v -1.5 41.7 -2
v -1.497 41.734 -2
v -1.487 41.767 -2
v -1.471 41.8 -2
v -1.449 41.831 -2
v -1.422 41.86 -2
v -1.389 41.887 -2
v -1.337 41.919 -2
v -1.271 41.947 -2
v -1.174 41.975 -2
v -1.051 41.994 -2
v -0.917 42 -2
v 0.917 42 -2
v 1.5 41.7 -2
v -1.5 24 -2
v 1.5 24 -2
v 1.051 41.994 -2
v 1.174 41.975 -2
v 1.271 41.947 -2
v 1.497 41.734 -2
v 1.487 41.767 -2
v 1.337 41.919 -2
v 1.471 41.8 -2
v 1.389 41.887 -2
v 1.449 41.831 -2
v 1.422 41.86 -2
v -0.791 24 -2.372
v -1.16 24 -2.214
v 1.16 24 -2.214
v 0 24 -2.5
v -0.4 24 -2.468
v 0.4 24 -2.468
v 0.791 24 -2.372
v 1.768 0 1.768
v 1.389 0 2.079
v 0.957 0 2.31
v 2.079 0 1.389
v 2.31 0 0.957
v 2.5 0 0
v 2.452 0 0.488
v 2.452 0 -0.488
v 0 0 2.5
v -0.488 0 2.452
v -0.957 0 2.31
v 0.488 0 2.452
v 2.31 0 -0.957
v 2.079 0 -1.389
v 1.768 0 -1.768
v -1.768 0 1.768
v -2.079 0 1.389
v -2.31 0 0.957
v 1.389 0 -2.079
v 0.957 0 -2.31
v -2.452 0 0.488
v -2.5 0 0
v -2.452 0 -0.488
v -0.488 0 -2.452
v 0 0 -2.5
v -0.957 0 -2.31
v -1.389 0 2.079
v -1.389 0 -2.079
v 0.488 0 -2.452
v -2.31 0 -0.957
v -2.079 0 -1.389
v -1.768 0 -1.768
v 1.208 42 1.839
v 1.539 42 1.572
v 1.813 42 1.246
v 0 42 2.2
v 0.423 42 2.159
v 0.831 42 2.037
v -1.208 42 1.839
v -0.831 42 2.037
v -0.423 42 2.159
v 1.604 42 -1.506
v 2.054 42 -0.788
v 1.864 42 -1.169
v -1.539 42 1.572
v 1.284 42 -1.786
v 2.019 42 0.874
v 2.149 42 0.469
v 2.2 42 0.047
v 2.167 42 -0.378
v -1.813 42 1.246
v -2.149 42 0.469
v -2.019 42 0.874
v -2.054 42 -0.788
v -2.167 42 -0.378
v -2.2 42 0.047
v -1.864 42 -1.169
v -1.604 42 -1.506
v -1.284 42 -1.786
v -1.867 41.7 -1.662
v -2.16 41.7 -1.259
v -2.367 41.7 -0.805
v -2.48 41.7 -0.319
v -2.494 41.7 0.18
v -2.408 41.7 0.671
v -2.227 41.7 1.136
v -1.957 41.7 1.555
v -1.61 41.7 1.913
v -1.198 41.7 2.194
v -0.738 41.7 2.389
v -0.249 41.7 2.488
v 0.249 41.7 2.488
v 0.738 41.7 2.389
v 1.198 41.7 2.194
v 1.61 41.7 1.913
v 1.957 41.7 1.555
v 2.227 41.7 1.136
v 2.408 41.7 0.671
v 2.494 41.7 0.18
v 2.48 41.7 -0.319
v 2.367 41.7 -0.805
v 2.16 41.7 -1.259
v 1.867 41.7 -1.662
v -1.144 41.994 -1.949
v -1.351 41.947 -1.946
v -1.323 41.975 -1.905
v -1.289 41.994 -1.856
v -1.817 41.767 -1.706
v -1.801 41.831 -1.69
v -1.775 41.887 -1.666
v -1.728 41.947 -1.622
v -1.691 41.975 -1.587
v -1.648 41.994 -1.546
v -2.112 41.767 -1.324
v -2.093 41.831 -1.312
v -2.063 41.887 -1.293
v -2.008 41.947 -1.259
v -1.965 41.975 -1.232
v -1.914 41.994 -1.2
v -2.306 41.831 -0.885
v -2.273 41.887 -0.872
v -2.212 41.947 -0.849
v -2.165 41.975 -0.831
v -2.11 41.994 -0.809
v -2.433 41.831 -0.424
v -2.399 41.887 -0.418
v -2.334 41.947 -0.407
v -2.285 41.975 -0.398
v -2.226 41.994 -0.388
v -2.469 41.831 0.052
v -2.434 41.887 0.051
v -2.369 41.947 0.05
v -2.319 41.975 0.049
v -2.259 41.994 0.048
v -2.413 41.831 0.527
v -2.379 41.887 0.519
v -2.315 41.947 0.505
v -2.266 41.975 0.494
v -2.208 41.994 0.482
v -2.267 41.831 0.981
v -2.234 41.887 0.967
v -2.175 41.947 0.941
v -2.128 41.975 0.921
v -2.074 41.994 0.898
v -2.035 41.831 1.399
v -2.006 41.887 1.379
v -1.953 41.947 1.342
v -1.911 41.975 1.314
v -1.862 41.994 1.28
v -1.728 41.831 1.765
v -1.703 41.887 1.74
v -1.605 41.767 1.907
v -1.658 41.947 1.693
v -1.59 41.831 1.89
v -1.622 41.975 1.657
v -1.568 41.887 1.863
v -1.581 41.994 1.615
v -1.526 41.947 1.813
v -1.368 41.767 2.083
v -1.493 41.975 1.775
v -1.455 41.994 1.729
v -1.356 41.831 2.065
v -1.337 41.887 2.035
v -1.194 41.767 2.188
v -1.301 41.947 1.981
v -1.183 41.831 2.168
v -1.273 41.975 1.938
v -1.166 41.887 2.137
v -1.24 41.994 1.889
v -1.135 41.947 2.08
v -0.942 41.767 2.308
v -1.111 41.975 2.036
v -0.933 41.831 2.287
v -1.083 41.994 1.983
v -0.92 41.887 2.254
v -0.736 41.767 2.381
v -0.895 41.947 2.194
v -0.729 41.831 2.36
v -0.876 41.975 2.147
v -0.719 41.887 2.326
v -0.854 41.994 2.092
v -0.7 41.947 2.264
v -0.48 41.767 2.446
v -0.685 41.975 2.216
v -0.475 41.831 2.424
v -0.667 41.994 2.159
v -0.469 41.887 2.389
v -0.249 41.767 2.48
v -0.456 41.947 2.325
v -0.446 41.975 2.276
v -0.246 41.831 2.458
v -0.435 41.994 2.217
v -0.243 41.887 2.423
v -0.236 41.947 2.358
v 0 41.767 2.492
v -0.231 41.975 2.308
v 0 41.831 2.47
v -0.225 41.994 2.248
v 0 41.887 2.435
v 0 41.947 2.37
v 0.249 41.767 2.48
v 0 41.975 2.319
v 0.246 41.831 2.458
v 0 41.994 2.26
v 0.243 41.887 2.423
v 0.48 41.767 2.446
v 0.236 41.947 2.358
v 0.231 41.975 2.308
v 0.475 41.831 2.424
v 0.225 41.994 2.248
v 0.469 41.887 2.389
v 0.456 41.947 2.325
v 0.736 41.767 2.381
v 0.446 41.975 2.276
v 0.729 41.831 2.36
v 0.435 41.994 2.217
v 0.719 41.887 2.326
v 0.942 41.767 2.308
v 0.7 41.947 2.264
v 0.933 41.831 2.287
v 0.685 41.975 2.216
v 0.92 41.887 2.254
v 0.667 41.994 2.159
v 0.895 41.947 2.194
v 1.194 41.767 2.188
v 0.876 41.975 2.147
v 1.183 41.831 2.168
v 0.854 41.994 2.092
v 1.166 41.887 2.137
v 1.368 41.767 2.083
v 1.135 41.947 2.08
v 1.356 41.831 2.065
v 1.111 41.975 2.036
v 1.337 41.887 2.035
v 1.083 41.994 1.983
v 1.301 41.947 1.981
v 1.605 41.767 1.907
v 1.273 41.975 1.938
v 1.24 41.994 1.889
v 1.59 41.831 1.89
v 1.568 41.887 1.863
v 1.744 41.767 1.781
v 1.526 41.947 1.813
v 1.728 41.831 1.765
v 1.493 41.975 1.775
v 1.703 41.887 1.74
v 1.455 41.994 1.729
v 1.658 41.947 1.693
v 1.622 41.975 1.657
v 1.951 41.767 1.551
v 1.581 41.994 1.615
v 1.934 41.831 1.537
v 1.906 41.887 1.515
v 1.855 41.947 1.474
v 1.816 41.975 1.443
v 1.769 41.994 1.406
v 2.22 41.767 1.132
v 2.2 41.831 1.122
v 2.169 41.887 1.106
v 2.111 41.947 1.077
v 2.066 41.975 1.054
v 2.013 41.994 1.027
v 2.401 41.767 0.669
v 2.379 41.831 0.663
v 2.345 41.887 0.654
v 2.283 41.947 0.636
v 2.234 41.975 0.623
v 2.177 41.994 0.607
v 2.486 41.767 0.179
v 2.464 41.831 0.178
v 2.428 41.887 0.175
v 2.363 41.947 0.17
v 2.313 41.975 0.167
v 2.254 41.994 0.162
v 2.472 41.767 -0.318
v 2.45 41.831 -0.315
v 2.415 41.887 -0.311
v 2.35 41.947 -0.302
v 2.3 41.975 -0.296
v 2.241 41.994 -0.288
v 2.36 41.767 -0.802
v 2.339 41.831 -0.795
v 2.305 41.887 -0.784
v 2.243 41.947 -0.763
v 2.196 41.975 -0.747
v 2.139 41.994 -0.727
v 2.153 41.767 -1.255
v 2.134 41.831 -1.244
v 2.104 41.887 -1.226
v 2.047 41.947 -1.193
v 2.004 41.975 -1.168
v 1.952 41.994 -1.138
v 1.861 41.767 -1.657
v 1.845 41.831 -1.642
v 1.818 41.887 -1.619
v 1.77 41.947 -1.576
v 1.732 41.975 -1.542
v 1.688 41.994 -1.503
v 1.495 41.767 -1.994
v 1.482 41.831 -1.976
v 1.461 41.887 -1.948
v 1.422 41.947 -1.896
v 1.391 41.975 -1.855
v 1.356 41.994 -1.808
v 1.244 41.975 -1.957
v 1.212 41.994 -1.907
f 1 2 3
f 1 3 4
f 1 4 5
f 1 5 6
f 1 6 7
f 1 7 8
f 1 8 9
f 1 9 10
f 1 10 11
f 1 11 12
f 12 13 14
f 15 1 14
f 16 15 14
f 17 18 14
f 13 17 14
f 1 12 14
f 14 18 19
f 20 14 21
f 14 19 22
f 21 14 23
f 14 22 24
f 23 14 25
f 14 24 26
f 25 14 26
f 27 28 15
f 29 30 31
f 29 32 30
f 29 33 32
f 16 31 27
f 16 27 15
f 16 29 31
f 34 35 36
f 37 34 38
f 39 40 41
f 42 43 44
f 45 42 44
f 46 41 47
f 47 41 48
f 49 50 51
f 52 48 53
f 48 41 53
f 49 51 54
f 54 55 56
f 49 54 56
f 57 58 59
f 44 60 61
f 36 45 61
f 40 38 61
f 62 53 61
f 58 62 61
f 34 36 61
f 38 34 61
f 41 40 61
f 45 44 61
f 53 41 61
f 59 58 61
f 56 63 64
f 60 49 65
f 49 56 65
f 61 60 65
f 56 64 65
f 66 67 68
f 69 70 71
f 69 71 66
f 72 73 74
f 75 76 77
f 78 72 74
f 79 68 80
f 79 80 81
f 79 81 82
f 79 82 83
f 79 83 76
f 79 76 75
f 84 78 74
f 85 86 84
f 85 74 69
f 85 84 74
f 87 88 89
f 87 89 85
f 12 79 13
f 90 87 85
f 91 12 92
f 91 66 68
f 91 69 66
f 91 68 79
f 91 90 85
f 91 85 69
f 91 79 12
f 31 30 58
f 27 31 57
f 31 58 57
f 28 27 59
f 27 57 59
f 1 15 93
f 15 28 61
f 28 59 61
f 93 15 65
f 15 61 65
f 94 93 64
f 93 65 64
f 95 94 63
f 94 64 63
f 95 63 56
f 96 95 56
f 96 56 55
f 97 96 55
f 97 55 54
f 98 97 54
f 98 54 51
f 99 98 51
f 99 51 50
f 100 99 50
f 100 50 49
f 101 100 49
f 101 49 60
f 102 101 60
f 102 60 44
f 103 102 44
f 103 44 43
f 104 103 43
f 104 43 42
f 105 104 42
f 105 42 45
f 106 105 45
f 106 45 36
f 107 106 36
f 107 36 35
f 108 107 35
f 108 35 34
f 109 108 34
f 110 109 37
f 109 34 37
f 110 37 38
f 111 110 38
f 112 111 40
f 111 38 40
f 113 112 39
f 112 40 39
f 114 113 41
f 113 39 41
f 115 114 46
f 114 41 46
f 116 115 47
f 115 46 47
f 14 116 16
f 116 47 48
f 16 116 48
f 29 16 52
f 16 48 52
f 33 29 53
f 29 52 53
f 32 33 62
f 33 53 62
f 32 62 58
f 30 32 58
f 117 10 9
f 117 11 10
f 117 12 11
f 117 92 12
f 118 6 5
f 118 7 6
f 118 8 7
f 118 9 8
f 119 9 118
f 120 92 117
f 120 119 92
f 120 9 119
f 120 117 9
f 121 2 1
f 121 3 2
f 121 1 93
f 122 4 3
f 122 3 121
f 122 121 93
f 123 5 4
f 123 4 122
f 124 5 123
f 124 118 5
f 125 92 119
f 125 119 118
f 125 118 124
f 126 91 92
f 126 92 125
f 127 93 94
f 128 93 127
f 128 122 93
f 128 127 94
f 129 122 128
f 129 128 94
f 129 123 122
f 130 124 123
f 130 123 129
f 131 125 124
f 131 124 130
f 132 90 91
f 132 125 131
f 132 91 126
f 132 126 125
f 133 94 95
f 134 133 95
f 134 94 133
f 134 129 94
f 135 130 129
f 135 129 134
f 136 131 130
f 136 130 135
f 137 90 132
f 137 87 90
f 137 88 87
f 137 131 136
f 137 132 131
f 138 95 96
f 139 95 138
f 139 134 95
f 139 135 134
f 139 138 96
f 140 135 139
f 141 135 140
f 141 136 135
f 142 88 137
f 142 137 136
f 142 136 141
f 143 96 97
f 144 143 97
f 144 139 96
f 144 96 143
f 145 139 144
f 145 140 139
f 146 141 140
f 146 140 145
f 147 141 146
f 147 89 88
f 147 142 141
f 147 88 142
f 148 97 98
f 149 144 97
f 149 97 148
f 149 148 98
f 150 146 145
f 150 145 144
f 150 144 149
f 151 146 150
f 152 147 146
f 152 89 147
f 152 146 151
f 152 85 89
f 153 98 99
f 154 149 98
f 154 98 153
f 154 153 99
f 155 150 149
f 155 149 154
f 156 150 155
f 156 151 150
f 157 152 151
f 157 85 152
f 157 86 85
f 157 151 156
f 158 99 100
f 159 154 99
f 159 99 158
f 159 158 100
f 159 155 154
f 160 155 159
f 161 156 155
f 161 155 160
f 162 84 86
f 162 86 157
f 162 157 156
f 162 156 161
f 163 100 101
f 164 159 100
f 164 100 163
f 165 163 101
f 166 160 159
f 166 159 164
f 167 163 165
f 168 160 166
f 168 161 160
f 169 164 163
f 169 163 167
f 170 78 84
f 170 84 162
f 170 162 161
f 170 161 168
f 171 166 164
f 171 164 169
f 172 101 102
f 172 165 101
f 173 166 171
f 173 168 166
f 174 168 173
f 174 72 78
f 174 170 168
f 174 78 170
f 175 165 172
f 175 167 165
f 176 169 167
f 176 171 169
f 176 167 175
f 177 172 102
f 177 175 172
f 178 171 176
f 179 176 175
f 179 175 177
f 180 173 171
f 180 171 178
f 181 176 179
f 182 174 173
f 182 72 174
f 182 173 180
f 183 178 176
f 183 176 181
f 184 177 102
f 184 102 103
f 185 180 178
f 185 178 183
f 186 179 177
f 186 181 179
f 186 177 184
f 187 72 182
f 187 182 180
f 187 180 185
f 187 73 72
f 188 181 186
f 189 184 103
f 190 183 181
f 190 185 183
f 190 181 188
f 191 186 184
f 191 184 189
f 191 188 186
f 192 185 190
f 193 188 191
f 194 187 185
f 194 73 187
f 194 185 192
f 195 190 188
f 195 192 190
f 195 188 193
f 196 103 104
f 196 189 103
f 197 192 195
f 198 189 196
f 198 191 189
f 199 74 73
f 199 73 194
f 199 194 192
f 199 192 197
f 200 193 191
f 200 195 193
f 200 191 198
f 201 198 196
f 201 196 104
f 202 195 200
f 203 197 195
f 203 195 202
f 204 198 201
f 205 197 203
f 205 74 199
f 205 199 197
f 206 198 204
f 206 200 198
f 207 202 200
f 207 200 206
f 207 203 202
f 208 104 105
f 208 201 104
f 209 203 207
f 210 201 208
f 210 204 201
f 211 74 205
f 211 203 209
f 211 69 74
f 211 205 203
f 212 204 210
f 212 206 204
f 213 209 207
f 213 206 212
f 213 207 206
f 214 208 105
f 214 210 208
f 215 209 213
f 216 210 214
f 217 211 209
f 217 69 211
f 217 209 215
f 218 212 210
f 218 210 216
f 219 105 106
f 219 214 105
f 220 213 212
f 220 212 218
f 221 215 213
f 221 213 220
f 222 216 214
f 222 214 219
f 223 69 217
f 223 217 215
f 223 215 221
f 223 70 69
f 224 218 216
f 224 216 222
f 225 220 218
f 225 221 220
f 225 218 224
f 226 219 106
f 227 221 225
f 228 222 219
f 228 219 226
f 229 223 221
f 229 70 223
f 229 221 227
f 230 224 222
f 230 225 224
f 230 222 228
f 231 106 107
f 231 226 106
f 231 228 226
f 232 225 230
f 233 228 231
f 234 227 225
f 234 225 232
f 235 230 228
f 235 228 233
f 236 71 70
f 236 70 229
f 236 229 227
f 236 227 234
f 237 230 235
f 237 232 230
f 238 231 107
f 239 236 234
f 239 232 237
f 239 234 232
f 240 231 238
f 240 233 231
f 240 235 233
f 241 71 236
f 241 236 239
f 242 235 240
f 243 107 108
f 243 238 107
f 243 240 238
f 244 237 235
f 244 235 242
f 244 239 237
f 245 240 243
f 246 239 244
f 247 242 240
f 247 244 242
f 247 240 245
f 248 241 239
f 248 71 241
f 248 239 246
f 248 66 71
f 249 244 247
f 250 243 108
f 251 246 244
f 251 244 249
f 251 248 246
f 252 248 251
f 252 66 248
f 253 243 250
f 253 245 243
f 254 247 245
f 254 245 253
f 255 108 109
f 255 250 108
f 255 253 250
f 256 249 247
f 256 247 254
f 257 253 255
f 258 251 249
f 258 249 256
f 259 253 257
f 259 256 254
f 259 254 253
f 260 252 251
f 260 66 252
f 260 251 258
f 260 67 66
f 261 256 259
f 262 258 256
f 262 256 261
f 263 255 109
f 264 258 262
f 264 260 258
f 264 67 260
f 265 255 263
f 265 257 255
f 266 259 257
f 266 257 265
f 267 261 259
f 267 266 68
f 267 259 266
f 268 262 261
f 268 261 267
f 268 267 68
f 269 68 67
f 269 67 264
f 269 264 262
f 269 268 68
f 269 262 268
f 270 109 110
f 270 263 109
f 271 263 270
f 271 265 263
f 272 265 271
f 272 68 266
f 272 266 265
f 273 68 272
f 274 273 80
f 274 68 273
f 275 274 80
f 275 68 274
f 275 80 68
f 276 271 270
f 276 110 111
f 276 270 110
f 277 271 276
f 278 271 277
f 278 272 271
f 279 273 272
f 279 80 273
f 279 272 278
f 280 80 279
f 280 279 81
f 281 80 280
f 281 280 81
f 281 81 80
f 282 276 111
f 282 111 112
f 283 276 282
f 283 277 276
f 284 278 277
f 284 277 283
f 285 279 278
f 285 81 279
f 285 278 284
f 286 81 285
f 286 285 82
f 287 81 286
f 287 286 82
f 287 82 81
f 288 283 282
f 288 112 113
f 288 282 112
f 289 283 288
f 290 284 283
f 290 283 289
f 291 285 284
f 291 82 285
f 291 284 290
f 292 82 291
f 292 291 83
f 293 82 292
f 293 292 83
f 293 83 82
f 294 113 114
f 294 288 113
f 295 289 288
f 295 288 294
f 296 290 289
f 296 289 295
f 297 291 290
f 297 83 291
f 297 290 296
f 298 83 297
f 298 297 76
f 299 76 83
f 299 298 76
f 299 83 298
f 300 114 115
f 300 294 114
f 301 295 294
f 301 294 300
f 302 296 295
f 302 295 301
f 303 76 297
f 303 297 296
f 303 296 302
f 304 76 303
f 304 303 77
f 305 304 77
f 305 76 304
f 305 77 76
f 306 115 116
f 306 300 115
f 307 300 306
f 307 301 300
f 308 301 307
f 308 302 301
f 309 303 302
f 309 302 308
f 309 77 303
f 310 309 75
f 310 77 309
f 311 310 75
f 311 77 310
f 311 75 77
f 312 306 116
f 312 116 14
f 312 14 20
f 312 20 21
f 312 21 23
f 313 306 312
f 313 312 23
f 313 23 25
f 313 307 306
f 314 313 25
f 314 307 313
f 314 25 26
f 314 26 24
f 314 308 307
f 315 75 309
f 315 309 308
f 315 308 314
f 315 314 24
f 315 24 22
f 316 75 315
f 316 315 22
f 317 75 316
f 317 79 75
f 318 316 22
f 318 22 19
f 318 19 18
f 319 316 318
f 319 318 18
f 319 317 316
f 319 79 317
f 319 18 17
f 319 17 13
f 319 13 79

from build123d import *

# Parameters (mm, degrees)
SKETCH1_R           = 2.5
BOSS_EXTRUDE1_DEPTH = 42
SKETCH2_W           = 8.231649798
SKETCH2_H           = 2.477236303
CUT_EXTRUDE1_DEPTH  = 18
FILLET1_R           = 0.3


with BuildPart() as part:
    # Sketch1 → Boss-Extrude1 (new body)
    with BuildSketch(Plane(origin=(0, 0, 0), x_dir=(1, 0, 0), z_dir=(0, 1, 0))):
        with Locations(Location((0, 0, 0), (0, 0, 90))):
            Circle(SKETCH1_R)
    extrude(amount=BOSS_EXTRUDE1_DEPTH)

    # Sketch2 → Cut-Extrude1 (cut)
    with BuildSketch(Plane(origin=(0, 42, 0), x_dir=(1, 0, 0), z_dir=(0, 1, 0))):
        with Locations((-0.064511362, 3.238618152)):
            Rectangle(SKETCH2_W, SKETCH2_H)
    extrude(amount=-CUT_EXTRUDE1_DEPTH, mode=Mode.SUBTRACT)

    # Fillet1
    fillet1_edges = [part.edges().sort_by_distance(p)[0] for p in [
        (0, 42, 2.5),
    ]]
    fillet(fillet1_edges, radius=FILLET1_R)


solid = part.part
